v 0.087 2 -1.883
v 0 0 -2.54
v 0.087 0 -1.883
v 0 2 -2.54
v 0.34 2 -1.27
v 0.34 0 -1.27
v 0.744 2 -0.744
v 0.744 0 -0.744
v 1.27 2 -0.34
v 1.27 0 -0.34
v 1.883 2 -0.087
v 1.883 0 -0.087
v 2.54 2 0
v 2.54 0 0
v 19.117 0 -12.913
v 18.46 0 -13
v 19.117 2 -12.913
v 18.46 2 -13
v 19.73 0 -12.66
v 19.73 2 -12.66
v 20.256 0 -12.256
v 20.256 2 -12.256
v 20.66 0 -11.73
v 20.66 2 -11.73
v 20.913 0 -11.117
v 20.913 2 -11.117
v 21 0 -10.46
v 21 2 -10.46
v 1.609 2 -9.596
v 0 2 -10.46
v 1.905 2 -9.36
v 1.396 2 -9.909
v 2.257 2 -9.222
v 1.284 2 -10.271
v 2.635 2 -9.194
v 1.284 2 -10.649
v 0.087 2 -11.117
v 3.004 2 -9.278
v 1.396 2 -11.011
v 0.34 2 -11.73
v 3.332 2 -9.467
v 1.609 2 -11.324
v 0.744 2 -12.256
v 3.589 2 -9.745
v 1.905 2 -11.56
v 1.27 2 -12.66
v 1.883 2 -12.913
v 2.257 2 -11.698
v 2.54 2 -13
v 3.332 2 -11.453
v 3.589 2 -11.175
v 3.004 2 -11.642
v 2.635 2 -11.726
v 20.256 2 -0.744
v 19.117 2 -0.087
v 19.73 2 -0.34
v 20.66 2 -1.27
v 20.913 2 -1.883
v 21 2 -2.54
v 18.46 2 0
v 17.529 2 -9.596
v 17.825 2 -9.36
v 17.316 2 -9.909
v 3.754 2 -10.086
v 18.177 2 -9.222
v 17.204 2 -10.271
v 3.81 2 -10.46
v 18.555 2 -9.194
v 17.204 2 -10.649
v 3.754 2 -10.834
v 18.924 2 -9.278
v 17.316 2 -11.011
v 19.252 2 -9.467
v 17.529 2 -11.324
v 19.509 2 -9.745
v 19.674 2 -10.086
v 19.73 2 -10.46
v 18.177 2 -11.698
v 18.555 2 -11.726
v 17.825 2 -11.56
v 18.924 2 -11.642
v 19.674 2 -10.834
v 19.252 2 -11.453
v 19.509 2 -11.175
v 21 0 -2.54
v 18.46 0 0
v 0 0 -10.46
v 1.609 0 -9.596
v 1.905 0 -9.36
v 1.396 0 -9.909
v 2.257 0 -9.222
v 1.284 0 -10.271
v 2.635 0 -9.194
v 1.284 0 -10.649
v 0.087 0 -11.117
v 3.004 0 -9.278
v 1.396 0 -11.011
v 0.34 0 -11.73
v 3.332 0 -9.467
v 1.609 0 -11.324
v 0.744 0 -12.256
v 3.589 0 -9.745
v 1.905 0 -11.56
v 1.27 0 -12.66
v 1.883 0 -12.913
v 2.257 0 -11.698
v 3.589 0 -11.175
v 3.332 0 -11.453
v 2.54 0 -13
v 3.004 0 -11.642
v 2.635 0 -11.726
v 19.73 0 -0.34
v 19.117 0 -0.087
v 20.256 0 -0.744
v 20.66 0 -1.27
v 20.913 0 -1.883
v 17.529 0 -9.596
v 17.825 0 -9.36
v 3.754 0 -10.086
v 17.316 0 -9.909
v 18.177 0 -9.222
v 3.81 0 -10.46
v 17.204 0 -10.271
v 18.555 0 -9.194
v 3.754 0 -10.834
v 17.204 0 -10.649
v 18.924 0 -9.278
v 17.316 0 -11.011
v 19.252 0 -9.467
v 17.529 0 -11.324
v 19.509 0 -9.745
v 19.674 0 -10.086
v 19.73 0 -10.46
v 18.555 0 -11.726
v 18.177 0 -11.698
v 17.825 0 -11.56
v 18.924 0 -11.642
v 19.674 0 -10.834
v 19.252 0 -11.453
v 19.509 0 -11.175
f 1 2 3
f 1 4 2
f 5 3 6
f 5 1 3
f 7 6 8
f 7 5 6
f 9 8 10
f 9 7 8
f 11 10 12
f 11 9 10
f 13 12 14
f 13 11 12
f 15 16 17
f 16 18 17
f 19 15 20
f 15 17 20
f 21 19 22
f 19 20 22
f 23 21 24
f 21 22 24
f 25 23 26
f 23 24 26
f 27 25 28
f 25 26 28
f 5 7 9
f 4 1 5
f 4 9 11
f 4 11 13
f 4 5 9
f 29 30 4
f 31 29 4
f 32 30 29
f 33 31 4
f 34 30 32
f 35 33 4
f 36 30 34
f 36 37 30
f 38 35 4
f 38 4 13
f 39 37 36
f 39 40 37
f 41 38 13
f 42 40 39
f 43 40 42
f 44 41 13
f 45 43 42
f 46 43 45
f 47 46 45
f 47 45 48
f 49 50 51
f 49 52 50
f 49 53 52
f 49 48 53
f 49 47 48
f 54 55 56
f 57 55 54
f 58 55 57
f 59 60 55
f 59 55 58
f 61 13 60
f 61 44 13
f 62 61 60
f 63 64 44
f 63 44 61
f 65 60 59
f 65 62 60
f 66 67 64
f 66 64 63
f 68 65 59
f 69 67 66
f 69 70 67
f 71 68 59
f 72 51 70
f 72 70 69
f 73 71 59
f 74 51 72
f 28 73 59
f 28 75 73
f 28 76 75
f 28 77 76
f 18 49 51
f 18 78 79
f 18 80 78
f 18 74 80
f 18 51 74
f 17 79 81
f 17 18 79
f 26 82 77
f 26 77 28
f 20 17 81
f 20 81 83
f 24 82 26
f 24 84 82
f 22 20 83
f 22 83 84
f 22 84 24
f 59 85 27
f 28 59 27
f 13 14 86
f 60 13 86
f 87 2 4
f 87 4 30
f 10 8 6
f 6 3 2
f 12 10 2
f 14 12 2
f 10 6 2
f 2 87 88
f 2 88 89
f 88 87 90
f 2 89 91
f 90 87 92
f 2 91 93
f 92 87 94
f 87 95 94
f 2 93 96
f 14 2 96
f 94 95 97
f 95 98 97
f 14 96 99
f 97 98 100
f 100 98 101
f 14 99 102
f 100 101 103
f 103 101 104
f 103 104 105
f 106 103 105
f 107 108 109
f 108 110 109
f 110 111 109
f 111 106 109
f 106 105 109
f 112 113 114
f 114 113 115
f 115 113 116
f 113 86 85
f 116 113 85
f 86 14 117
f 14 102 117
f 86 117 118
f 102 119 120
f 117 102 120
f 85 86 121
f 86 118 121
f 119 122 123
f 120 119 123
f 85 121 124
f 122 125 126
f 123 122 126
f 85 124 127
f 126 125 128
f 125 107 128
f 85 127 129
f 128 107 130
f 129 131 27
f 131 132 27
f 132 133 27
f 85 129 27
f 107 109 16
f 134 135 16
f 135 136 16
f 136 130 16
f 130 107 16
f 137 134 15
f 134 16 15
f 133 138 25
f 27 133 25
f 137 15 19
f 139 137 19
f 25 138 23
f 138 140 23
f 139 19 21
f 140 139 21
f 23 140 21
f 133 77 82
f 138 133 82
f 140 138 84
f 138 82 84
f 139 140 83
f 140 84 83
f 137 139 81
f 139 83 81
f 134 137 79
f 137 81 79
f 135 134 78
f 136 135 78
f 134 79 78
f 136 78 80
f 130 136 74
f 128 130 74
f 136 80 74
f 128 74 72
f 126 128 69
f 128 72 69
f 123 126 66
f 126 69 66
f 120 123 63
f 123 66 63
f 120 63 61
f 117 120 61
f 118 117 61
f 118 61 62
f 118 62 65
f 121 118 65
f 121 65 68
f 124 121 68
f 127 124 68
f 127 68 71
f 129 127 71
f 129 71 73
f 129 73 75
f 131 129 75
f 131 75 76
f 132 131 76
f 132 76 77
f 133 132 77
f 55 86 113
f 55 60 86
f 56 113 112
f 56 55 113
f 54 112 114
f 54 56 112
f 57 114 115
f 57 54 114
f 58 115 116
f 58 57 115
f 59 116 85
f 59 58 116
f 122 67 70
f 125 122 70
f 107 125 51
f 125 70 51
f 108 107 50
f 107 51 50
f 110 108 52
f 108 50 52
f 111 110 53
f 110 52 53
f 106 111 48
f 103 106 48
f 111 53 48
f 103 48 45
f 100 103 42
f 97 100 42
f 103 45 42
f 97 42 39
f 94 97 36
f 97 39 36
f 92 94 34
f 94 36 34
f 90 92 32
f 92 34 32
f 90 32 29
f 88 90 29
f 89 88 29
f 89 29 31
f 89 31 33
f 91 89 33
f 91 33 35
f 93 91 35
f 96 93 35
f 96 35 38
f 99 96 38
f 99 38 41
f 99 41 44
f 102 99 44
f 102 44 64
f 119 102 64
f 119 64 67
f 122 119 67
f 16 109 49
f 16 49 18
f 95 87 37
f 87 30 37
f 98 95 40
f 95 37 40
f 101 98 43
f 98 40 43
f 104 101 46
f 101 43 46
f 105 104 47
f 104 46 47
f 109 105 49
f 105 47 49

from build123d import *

# Parameters (mm, degrees)
SKETCH1_W           = 21
SKETCH1_H           = 13
BOSS_EXTRUDE1_DEPTH = 2
SKETCH2_R           = 1.27
CUT_EXTRUDE1_DEPTH  = 3
FILLET1_R           = 2.54


with BuildPart() as part:
    # Sketch1 → Boss-Extrude1 (new body)
    with BuildSketch(Plane(origin=(0, 0, 0), x_dir=(1, 0, 0), z_dir=(0, 1, 0))):
        with Locations((10.5, 6.5)):
            Rectangle(SKETCH1_W, SKETCH1_H)
    extrude(amount=BOSS_EXTRUDE1_DEPTH)

    # Sketch2 → Cut-Extrude1 (cut, through all)
    with BuildSketch(Plane(origin=(0, 2, 0), x_dir=(1, 0, 0), z_dir=(0, 1, 0))):
        with Locations((2.54, 10.46)):
            Circle(SKETCH2_R)
        with Locations((18.46, 10.46)):
            Circle(SKETCH2_R)
    extrude(amount=-CUT_EXTRUDE1_DEPTH, mode=Mode.SUBTRACT)

    # Fillet1
    fillet1_edges = [part.edges().sort_by_distance(p)[0] for p in [
        (0, 1, -13),
        (21, 1, -13),
        (21, 1, 0),
        (0, 1, 0),
    ]]
    fillet(fillet1_edges, radius=FILLET1_R)


solid = part.part
